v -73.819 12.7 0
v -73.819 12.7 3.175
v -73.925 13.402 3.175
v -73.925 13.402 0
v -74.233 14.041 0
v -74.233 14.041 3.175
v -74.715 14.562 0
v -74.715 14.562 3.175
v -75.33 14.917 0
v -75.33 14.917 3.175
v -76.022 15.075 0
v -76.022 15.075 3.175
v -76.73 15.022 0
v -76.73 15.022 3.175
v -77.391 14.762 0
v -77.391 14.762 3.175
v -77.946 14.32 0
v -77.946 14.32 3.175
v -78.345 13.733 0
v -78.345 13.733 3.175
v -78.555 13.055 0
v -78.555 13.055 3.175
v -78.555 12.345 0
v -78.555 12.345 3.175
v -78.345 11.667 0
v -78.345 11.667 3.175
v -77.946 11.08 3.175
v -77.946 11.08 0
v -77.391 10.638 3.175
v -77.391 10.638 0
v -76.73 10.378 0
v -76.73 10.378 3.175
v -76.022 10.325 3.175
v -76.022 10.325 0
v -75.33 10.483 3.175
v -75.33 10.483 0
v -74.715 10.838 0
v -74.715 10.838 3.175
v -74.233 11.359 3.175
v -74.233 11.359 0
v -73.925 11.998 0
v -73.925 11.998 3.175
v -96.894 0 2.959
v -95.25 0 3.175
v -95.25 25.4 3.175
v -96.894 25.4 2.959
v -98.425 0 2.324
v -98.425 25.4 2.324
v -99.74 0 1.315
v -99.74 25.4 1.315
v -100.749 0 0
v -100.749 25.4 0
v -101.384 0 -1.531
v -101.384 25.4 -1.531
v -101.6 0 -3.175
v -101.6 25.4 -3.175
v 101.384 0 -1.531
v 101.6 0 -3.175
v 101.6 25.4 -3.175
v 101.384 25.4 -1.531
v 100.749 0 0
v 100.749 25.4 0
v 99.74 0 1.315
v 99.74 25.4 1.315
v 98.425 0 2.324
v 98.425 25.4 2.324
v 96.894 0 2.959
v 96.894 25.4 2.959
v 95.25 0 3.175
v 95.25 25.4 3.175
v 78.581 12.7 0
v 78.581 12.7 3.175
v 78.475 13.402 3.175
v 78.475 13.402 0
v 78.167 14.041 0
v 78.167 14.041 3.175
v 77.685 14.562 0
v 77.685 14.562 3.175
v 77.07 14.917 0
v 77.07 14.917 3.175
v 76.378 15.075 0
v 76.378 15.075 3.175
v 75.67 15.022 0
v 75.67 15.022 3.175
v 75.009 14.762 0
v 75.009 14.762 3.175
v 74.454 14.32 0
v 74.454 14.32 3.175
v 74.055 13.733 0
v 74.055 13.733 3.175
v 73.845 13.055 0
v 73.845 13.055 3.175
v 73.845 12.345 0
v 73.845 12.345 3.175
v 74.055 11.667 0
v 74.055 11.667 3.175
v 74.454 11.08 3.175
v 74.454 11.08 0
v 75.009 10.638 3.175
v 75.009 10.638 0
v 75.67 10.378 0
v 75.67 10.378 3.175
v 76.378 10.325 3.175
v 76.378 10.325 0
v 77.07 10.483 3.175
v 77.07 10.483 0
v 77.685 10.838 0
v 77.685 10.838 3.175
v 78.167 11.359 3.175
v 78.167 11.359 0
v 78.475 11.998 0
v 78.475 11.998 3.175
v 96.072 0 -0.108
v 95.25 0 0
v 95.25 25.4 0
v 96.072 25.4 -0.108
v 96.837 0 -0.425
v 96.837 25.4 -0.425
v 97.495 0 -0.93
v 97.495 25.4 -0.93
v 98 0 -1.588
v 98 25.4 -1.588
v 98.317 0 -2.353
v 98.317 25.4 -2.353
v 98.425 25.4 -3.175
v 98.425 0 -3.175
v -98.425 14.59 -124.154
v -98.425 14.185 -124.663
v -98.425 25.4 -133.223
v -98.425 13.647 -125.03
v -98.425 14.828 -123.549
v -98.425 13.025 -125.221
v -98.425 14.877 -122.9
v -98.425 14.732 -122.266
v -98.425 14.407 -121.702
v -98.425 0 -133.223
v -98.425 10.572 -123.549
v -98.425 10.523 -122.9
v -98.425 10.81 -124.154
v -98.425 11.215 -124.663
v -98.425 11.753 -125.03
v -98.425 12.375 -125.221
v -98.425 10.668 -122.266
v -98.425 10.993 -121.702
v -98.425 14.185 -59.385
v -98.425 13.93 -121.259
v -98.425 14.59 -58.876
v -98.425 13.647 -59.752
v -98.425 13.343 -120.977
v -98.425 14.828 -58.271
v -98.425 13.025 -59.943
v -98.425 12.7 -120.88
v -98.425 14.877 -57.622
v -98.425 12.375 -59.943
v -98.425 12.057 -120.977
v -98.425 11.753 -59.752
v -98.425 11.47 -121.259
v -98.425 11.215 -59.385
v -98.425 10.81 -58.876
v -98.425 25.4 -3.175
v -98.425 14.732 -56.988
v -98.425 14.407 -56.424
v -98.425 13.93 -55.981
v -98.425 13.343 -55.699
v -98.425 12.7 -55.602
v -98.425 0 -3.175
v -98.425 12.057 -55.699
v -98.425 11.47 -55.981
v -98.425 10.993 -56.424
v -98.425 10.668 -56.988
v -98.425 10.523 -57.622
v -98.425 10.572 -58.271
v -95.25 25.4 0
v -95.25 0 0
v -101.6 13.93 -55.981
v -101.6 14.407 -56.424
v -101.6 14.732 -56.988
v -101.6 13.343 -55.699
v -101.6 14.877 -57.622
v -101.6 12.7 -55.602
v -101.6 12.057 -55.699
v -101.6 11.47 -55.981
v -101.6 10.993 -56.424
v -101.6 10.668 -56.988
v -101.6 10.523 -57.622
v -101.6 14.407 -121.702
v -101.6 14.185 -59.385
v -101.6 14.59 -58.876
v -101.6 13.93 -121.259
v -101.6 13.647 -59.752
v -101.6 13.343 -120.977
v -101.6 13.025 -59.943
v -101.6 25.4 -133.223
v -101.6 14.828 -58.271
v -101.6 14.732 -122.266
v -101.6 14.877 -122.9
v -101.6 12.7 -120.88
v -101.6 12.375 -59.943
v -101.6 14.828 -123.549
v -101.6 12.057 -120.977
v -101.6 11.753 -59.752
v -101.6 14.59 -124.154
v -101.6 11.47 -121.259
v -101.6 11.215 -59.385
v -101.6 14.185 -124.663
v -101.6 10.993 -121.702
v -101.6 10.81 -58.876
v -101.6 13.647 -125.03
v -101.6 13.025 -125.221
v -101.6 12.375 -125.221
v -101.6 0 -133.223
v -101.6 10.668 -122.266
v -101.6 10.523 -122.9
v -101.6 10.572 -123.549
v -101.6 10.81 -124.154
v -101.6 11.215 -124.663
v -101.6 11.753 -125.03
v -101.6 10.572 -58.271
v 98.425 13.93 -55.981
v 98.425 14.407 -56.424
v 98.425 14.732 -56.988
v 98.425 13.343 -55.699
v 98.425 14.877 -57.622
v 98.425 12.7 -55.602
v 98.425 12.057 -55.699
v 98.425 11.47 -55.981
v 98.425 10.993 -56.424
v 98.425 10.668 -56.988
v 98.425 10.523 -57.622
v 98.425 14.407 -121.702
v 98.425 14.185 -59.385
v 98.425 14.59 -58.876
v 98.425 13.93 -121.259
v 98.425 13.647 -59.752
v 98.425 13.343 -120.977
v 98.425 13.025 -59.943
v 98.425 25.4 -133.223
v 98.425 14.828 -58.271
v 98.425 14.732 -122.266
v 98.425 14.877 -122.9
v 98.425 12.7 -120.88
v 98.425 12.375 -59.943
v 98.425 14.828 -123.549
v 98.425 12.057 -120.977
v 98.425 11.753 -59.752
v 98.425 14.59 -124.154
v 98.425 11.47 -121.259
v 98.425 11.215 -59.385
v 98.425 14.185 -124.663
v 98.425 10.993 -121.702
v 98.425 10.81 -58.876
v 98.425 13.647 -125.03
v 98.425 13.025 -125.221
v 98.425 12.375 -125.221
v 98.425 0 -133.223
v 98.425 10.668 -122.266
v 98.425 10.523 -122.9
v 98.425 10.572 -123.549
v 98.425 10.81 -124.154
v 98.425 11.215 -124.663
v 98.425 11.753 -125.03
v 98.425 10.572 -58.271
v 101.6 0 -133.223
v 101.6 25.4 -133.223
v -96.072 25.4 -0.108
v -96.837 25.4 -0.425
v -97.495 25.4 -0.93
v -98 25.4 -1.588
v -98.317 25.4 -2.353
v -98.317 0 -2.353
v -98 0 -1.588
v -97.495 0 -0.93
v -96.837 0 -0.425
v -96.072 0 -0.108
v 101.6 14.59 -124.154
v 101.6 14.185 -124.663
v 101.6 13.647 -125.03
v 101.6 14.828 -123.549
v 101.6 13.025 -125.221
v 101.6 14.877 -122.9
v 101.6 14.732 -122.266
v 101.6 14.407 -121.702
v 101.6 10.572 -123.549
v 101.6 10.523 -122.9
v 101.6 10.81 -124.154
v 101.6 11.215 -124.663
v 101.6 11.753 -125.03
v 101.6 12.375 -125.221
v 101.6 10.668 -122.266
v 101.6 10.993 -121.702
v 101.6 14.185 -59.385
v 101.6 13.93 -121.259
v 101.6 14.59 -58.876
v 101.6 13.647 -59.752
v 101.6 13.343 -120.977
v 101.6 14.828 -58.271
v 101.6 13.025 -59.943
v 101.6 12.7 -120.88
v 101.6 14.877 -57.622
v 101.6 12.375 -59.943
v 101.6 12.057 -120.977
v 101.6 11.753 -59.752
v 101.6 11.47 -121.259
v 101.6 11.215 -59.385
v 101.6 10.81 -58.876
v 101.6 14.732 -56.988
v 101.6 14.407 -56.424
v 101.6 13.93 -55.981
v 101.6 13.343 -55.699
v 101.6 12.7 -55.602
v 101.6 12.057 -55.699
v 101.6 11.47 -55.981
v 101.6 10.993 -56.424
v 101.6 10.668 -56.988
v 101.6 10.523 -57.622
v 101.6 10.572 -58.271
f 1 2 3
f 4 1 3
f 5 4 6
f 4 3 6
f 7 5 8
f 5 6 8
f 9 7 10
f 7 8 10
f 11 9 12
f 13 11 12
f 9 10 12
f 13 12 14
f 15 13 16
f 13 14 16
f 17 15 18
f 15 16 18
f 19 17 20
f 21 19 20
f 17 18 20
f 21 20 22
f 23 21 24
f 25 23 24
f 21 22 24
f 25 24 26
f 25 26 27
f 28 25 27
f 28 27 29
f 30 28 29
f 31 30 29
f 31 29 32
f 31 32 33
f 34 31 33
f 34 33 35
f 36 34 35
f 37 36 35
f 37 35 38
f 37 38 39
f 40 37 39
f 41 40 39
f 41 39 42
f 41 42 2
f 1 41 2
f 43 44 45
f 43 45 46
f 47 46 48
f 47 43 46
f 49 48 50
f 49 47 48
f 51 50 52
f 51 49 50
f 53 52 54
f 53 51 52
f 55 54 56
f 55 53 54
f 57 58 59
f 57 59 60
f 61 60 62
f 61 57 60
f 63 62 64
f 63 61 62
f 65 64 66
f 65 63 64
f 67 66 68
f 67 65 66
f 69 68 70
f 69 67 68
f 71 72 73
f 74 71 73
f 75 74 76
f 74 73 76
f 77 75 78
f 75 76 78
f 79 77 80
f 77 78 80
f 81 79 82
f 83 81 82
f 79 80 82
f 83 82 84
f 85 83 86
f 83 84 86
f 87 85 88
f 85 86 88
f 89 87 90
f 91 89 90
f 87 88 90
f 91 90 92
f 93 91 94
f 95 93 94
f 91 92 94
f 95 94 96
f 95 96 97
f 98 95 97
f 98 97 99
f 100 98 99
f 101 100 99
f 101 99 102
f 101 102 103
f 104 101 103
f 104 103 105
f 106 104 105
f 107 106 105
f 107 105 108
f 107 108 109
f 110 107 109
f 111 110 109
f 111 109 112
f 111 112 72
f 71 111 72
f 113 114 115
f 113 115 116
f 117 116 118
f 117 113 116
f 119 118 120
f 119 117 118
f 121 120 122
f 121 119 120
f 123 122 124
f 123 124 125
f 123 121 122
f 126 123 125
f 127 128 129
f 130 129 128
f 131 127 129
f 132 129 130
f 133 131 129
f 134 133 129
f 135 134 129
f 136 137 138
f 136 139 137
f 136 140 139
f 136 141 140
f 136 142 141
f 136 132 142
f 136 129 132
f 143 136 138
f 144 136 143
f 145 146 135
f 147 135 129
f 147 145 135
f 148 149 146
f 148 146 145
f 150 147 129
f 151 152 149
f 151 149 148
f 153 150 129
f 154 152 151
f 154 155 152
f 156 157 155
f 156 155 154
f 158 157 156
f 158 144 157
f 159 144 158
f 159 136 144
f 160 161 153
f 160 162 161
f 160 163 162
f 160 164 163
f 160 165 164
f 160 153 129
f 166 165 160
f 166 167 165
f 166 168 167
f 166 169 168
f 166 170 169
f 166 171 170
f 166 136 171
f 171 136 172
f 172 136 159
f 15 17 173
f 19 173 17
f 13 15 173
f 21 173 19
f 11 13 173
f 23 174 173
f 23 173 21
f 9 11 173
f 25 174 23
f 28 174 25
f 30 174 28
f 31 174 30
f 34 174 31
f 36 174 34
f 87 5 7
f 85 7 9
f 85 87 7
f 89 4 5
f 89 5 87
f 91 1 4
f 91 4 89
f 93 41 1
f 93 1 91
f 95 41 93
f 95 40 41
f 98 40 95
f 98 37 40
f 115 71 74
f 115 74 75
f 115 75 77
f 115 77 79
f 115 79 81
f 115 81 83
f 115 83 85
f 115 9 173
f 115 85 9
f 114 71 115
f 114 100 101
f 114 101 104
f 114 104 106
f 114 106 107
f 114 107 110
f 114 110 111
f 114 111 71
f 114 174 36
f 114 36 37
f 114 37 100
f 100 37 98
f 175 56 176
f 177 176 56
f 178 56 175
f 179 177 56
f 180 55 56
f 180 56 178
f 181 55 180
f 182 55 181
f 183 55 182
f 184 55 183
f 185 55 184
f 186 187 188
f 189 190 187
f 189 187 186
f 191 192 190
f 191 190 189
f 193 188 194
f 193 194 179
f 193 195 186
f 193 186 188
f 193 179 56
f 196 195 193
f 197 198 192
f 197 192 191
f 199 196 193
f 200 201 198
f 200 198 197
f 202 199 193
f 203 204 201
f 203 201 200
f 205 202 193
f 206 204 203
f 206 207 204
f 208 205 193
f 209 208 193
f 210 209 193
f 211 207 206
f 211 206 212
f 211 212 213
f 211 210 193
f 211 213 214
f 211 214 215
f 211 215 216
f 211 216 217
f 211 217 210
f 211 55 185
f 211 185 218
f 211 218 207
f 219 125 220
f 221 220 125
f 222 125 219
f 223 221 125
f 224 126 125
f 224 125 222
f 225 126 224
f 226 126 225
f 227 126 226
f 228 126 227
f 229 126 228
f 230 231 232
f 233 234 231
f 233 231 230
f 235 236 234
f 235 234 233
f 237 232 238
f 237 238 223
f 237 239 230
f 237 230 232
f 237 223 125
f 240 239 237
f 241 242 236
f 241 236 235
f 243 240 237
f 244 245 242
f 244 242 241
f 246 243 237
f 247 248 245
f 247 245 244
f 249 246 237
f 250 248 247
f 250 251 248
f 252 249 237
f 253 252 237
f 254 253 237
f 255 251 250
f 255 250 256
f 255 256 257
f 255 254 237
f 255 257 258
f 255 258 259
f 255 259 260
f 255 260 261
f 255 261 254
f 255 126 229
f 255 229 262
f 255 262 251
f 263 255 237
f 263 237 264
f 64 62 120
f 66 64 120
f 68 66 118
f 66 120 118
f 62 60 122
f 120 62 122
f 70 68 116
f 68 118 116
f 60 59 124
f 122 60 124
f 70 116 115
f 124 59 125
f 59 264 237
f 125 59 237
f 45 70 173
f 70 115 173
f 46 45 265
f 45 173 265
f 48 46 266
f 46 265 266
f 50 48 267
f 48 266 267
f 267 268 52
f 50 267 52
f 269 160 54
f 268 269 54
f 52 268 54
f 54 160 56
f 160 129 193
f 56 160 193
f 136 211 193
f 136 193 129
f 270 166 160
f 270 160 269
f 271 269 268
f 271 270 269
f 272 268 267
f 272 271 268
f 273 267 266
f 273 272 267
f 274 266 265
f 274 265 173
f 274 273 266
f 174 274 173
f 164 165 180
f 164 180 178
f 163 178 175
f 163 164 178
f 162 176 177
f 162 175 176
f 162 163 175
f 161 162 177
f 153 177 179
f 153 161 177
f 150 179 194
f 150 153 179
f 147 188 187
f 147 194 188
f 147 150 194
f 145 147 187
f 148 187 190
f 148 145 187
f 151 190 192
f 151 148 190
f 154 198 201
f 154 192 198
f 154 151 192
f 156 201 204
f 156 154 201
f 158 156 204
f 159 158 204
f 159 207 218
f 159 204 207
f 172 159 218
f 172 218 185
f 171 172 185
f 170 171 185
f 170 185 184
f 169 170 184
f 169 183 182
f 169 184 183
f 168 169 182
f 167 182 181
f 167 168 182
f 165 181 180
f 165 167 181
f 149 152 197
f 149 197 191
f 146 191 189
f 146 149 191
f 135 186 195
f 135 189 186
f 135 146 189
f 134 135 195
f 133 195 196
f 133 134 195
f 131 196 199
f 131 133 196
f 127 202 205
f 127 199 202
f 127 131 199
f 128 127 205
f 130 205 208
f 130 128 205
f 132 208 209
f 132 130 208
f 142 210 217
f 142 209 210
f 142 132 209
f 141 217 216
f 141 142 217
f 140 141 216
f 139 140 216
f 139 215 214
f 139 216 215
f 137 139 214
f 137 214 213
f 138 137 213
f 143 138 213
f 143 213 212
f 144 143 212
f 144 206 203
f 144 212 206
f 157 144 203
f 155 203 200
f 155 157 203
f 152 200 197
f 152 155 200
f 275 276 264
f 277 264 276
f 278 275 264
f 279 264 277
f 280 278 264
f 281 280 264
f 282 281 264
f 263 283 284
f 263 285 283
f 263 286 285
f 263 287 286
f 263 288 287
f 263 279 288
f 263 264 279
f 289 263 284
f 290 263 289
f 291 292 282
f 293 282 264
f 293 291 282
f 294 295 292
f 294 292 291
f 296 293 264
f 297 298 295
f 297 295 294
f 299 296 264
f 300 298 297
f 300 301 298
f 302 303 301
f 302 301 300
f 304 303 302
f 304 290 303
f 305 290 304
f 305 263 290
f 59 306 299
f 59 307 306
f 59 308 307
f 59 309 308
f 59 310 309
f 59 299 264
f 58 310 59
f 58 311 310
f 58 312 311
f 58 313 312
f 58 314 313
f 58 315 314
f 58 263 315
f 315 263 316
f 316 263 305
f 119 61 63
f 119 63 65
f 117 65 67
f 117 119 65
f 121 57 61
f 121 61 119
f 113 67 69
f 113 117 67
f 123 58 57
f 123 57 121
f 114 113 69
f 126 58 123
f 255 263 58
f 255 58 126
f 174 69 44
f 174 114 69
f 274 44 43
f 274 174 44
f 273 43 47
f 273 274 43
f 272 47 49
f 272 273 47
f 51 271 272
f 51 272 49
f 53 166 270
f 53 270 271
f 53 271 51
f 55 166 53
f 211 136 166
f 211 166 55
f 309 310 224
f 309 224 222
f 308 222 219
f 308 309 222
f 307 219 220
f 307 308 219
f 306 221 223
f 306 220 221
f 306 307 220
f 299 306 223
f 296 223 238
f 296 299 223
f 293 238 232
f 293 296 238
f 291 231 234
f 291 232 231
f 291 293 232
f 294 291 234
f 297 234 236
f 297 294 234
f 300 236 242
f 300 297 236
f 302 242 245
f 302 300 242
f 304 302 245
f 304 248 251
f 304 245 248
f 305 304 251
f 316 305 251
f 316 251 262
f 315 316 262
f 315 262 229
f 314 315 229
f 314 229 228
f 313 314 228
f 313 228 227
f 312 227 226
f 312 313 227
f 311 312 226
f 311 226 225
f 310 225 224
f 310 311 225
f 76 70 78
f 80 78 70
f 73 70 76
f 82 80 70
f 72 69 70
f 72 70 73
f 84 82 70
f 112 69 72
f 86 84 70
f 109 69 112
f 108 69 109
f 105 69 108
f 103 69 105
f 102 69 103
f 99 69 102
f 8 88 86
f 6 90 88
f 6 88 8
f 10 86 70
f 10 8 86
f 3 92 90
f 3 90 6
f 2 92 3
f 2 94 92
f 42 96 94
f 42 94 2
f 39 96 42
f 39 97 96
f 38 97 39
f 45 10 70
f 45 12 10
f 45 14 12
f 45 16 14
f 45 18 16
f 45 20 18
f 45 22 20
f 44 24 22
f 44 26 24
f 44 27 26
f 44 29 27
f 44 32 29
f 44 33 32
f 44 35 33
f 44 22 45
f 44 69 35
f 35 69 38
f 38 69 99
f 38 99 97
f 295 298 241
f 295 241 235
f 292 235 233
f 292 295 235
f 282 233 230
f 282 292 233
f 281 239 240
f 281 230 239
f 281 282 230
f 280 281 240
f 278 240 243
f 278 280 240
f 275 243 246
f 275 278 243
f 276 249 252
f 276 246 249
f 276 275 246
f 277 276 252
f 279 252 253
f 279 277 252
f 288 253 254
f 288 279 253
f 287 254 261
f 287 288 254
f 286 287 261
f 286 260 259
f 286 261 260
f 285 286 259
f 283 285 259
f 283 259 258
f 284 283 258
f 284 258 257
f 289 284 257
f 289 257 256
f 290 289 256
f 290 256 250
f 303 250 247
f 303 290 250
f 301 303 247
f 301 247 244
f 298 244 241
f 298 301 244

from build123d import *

# Parameters (mm, degrees)
BASE_FLANGE1_DEPTH         = 25.4
F_1_8_0_1250_DOWEL_HOLE1_D = 4.7625
CUT_EXTRUDE1_DEPTH         = 242.668219578
CUT_EXTRUDE1_DEPTH_BACK    = 242.668219578
SKETCH8_R                  = 2.1828125


# Sheet-metal steps are written as plain solids
with BuildPart() as part:
    # Sketch1 → Base-Flange1 (new body)
    with BuildSketch(Plane(origin=(0, 0, 0), x_dir=(1, 0, 0), z_dir=(0, 1, 0))):
        with BuildLine():
            Line((-98.425, 133.223), (-98.425, 3.175))
            ThreePointArc((-98.425, 3.175), (-97.49506403, 0.92993597), (-95.25, 0))
            Line((-95.25, 0), (95.25, 0))
            ThreePointArc((95.25, 0), (97.49506403, 0.92993597), (98.425, 3.175))
            Line((98.425, 3.175), (98.425, 133.223))
            Line((98.425, 133.223), (101.6, 133.223))
            Line((101.6, 133.223), (101.6, 3.175))
            ThreePointArc((101.6, 3.175), (99.740128061, -1.315128061), (95.25, -3.175))
            Line((95.25, -3.175), (-95.25, -3.175))
            ThreePointArc((-95.25, -3.175), (-99.740128061, -1.315128061), (-101.6, 3.175))
            Line((-101.6, 3.175), (-101.6, 133.223))
            Line((-101.6, 133.223), (-98.425, 133.223))
        make_face()
    extrude(amount=BASE_FLANGE1_DEPTH)

    # 1/8 (0.1250) Dowel Hole1 (through all)
    with Locations(Plane(origin=(0, 0, 0), x_dir=(-1, 0, 0), z_dir=(0, 0, -1))):
        with Locations((76.2, 12.7), (-76.2, 12.7)):
            Hole(F_1_8_0_1250_DOWEL_HOLE1_D / 2)

    # Sketch8 → Cut-Extrude1 (cut, two sides: drawn at the far end of the back side and taken through both)
    with BuildSketch(Plane.ZY.offset(-98.425).offset(-CUT_EXTRUDE1_DEPTH_BACK)):
        with Locations((-57.785, 12.7)):
            Circle(SKETCH8_R)
        with Locations((-123.063, 12.7)):
            Circle(SKETCH8_R)
    extrude(amount=CUT_EXTRUDE1_DEPTH + CUT_EXTRUDE1_DEPTH_BACK, mode=Mode.SUBTRACT)


solid = part.part
